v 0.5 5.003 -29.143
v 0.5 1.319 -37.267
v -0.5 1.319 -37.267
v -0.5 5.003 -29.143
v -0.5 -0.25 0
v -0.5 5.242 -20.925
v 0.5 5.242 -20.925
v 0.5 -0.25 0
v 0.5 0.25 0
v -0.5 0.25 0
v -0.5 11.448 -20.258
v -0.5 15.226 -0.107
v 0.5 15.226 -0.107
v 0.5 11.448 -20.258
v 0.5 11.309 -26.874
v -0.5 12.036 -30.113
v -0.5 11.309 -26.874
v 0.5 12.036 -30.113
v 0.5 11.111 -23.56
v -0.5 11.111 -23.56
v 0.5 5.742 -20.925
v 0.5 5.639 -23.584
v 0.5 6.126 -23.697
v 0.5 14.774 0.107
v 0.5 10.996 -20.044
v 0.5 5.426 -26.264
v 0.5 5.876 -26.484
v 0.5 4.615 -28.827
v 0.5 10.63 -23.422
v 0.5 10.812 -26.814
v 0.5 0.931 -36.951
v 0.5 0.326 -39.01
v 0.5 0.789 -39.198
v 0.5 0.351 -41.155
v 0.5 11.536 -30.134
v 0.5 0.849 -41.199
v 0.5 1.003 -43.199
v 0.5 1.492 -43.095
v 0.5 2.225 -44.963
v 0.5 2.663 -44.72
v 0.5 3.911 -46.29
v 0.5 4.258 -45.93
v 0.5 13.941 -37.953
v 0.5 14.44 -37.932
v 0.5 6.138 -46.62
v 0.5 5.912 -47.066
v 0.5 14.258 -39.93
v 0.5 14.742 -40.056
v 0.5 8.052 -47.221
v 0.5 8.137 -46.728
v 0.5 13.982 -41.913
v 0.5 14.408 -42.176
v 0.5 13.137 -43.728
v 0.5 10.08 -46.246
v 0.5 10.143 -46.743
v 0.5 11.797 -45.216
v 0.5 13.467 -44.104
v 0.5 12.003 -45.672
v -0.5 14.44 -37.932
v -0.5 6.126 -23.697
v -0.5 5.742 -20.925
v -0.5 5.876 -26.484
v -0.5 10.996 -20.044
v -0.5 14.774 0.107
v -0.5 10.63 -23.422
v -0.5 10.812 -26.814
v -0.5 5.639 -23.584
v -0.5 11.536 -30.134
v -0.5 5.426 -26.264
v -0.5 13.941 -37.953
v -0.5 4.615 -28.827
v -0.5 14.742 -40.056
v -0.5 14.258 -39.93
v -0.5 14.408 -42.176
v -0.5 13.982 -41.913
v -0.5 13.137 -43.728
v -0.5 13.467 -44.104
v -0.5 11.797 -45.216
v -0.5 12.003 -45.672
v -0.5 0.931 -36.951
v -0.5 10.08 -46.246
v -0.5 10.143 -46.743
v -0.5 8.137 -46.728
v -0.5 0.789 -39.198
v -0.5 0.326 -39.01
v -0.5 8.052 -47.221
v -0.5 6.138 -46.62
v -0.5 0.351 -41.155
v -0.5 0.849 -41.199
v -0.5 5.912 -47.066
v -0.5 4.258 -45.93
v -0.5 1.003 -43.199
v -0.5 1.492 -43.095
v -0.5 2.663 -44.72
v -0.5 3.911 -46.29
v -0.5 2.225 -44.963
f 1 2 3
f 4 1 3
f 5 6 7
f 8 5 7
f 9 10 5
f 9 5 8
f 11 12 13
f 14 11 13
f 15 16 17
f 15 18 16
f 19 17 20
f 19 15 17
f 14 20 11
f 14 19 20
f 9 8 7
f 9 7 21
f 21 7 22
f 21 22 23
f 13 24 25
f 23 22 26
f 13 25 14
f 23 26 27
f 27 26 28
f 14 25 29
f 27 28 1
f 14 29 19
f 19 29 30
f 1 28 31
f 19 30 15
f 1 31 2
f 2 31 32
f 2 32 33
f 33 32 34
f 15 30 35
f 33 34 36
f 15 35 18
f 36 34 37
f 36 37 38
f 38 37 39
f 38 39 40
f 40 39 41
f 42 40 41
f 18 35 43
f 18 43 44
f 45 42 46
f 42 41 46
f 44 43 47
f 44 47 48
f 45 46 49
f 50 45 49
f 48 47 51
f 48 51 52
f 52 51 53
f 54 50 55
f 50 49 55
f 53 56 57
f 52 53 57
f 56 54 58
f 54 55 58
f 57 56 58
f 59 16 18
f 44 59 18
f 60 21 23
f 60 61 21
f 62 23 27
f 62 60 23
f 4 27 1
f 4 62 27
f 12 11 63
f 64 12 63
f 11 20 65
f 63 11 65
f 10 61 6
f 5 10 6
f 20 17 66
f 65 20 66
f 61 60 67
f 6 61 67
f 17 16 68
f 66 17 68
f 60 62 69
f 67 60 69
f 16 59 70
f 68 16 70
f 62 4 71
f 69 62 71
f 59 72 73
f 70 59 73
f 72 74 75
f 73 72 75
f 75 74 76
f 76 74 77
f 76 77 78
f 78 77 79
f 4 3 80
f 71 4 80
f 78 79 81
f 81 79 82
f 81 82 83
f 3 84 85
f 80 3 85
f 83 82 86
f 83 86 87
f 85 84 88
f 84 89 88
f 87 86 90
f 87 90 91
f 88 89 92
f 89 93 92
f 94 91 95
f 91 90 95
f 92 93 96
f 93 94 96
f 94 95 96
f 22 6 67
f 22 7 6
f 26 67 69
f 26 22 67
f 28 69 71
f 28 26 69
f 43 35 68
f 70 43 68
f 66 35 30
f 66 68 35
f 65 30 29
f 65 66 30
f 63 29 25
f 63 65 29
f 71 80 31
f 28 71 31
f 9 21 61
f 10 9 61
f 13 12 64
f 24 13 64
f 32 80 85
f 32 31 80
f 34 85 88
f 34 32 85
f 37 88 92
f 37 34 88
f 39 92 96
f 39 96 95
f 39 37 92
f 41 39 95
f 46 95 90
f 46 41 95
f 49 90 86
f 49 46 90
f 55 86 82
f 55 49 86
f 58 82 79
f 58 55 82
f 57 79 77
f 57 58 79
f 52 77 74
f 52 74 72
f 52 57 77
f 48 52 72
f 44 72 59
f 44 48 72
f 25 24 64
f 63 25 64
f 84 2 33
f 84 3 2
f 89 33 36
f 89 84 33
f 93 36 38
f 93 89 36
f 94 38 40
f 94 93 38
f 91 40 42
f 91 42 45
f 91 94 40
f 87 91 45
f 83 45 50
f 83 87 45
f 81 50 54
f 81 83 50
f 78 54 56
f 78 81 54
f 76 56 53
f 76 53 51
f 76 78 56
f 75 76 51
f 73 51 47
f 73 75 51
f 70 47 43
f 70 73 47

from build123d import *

# Parameters (mm, degrees)
IZIM1_W = 1
IZIM1_H = 0.5


with BuildPart() as part:
    # Süpür1: sweep along a path in Çizim2
    with BuildLine(Plane(origin=(0, 0, 0), x_dir=(0, 0, -1), z_dir=(1, 0, 0))) as s_p_r1_path:
        Line((0, 0), (20.925351885, 5.491949727))
        ThreePointArc((20.925351885, 5.491949727), (25.014077523, 5.844705367), (28.985134799, 4.808936092))
        Line((28.985134799, 4.808936092), (37.108981933, 1.124891018))
        ThreePointArc((37.108981933, 1.124891018), (46.985809894, 7.054511358), (37.942195071, 14.190697936))
        Line((37.942195071, 14.190697936), (30.12359745, 11.785993841))
        ThreePointArc((30.12359745, 11.785993841), (25.171390105, 10.89789359), (20.150614238, 11.22175983))
        Line((20.150614238, 11.22175983), (0, 15))
    # Çizim1 → Süpür1 (sweep)
    with BuildSketch(Plane.XY):
        Rectangle(IZIM1_W, IZIM1_H)
    sweep(path=s_p_r1_path.line)


solid = part.part
